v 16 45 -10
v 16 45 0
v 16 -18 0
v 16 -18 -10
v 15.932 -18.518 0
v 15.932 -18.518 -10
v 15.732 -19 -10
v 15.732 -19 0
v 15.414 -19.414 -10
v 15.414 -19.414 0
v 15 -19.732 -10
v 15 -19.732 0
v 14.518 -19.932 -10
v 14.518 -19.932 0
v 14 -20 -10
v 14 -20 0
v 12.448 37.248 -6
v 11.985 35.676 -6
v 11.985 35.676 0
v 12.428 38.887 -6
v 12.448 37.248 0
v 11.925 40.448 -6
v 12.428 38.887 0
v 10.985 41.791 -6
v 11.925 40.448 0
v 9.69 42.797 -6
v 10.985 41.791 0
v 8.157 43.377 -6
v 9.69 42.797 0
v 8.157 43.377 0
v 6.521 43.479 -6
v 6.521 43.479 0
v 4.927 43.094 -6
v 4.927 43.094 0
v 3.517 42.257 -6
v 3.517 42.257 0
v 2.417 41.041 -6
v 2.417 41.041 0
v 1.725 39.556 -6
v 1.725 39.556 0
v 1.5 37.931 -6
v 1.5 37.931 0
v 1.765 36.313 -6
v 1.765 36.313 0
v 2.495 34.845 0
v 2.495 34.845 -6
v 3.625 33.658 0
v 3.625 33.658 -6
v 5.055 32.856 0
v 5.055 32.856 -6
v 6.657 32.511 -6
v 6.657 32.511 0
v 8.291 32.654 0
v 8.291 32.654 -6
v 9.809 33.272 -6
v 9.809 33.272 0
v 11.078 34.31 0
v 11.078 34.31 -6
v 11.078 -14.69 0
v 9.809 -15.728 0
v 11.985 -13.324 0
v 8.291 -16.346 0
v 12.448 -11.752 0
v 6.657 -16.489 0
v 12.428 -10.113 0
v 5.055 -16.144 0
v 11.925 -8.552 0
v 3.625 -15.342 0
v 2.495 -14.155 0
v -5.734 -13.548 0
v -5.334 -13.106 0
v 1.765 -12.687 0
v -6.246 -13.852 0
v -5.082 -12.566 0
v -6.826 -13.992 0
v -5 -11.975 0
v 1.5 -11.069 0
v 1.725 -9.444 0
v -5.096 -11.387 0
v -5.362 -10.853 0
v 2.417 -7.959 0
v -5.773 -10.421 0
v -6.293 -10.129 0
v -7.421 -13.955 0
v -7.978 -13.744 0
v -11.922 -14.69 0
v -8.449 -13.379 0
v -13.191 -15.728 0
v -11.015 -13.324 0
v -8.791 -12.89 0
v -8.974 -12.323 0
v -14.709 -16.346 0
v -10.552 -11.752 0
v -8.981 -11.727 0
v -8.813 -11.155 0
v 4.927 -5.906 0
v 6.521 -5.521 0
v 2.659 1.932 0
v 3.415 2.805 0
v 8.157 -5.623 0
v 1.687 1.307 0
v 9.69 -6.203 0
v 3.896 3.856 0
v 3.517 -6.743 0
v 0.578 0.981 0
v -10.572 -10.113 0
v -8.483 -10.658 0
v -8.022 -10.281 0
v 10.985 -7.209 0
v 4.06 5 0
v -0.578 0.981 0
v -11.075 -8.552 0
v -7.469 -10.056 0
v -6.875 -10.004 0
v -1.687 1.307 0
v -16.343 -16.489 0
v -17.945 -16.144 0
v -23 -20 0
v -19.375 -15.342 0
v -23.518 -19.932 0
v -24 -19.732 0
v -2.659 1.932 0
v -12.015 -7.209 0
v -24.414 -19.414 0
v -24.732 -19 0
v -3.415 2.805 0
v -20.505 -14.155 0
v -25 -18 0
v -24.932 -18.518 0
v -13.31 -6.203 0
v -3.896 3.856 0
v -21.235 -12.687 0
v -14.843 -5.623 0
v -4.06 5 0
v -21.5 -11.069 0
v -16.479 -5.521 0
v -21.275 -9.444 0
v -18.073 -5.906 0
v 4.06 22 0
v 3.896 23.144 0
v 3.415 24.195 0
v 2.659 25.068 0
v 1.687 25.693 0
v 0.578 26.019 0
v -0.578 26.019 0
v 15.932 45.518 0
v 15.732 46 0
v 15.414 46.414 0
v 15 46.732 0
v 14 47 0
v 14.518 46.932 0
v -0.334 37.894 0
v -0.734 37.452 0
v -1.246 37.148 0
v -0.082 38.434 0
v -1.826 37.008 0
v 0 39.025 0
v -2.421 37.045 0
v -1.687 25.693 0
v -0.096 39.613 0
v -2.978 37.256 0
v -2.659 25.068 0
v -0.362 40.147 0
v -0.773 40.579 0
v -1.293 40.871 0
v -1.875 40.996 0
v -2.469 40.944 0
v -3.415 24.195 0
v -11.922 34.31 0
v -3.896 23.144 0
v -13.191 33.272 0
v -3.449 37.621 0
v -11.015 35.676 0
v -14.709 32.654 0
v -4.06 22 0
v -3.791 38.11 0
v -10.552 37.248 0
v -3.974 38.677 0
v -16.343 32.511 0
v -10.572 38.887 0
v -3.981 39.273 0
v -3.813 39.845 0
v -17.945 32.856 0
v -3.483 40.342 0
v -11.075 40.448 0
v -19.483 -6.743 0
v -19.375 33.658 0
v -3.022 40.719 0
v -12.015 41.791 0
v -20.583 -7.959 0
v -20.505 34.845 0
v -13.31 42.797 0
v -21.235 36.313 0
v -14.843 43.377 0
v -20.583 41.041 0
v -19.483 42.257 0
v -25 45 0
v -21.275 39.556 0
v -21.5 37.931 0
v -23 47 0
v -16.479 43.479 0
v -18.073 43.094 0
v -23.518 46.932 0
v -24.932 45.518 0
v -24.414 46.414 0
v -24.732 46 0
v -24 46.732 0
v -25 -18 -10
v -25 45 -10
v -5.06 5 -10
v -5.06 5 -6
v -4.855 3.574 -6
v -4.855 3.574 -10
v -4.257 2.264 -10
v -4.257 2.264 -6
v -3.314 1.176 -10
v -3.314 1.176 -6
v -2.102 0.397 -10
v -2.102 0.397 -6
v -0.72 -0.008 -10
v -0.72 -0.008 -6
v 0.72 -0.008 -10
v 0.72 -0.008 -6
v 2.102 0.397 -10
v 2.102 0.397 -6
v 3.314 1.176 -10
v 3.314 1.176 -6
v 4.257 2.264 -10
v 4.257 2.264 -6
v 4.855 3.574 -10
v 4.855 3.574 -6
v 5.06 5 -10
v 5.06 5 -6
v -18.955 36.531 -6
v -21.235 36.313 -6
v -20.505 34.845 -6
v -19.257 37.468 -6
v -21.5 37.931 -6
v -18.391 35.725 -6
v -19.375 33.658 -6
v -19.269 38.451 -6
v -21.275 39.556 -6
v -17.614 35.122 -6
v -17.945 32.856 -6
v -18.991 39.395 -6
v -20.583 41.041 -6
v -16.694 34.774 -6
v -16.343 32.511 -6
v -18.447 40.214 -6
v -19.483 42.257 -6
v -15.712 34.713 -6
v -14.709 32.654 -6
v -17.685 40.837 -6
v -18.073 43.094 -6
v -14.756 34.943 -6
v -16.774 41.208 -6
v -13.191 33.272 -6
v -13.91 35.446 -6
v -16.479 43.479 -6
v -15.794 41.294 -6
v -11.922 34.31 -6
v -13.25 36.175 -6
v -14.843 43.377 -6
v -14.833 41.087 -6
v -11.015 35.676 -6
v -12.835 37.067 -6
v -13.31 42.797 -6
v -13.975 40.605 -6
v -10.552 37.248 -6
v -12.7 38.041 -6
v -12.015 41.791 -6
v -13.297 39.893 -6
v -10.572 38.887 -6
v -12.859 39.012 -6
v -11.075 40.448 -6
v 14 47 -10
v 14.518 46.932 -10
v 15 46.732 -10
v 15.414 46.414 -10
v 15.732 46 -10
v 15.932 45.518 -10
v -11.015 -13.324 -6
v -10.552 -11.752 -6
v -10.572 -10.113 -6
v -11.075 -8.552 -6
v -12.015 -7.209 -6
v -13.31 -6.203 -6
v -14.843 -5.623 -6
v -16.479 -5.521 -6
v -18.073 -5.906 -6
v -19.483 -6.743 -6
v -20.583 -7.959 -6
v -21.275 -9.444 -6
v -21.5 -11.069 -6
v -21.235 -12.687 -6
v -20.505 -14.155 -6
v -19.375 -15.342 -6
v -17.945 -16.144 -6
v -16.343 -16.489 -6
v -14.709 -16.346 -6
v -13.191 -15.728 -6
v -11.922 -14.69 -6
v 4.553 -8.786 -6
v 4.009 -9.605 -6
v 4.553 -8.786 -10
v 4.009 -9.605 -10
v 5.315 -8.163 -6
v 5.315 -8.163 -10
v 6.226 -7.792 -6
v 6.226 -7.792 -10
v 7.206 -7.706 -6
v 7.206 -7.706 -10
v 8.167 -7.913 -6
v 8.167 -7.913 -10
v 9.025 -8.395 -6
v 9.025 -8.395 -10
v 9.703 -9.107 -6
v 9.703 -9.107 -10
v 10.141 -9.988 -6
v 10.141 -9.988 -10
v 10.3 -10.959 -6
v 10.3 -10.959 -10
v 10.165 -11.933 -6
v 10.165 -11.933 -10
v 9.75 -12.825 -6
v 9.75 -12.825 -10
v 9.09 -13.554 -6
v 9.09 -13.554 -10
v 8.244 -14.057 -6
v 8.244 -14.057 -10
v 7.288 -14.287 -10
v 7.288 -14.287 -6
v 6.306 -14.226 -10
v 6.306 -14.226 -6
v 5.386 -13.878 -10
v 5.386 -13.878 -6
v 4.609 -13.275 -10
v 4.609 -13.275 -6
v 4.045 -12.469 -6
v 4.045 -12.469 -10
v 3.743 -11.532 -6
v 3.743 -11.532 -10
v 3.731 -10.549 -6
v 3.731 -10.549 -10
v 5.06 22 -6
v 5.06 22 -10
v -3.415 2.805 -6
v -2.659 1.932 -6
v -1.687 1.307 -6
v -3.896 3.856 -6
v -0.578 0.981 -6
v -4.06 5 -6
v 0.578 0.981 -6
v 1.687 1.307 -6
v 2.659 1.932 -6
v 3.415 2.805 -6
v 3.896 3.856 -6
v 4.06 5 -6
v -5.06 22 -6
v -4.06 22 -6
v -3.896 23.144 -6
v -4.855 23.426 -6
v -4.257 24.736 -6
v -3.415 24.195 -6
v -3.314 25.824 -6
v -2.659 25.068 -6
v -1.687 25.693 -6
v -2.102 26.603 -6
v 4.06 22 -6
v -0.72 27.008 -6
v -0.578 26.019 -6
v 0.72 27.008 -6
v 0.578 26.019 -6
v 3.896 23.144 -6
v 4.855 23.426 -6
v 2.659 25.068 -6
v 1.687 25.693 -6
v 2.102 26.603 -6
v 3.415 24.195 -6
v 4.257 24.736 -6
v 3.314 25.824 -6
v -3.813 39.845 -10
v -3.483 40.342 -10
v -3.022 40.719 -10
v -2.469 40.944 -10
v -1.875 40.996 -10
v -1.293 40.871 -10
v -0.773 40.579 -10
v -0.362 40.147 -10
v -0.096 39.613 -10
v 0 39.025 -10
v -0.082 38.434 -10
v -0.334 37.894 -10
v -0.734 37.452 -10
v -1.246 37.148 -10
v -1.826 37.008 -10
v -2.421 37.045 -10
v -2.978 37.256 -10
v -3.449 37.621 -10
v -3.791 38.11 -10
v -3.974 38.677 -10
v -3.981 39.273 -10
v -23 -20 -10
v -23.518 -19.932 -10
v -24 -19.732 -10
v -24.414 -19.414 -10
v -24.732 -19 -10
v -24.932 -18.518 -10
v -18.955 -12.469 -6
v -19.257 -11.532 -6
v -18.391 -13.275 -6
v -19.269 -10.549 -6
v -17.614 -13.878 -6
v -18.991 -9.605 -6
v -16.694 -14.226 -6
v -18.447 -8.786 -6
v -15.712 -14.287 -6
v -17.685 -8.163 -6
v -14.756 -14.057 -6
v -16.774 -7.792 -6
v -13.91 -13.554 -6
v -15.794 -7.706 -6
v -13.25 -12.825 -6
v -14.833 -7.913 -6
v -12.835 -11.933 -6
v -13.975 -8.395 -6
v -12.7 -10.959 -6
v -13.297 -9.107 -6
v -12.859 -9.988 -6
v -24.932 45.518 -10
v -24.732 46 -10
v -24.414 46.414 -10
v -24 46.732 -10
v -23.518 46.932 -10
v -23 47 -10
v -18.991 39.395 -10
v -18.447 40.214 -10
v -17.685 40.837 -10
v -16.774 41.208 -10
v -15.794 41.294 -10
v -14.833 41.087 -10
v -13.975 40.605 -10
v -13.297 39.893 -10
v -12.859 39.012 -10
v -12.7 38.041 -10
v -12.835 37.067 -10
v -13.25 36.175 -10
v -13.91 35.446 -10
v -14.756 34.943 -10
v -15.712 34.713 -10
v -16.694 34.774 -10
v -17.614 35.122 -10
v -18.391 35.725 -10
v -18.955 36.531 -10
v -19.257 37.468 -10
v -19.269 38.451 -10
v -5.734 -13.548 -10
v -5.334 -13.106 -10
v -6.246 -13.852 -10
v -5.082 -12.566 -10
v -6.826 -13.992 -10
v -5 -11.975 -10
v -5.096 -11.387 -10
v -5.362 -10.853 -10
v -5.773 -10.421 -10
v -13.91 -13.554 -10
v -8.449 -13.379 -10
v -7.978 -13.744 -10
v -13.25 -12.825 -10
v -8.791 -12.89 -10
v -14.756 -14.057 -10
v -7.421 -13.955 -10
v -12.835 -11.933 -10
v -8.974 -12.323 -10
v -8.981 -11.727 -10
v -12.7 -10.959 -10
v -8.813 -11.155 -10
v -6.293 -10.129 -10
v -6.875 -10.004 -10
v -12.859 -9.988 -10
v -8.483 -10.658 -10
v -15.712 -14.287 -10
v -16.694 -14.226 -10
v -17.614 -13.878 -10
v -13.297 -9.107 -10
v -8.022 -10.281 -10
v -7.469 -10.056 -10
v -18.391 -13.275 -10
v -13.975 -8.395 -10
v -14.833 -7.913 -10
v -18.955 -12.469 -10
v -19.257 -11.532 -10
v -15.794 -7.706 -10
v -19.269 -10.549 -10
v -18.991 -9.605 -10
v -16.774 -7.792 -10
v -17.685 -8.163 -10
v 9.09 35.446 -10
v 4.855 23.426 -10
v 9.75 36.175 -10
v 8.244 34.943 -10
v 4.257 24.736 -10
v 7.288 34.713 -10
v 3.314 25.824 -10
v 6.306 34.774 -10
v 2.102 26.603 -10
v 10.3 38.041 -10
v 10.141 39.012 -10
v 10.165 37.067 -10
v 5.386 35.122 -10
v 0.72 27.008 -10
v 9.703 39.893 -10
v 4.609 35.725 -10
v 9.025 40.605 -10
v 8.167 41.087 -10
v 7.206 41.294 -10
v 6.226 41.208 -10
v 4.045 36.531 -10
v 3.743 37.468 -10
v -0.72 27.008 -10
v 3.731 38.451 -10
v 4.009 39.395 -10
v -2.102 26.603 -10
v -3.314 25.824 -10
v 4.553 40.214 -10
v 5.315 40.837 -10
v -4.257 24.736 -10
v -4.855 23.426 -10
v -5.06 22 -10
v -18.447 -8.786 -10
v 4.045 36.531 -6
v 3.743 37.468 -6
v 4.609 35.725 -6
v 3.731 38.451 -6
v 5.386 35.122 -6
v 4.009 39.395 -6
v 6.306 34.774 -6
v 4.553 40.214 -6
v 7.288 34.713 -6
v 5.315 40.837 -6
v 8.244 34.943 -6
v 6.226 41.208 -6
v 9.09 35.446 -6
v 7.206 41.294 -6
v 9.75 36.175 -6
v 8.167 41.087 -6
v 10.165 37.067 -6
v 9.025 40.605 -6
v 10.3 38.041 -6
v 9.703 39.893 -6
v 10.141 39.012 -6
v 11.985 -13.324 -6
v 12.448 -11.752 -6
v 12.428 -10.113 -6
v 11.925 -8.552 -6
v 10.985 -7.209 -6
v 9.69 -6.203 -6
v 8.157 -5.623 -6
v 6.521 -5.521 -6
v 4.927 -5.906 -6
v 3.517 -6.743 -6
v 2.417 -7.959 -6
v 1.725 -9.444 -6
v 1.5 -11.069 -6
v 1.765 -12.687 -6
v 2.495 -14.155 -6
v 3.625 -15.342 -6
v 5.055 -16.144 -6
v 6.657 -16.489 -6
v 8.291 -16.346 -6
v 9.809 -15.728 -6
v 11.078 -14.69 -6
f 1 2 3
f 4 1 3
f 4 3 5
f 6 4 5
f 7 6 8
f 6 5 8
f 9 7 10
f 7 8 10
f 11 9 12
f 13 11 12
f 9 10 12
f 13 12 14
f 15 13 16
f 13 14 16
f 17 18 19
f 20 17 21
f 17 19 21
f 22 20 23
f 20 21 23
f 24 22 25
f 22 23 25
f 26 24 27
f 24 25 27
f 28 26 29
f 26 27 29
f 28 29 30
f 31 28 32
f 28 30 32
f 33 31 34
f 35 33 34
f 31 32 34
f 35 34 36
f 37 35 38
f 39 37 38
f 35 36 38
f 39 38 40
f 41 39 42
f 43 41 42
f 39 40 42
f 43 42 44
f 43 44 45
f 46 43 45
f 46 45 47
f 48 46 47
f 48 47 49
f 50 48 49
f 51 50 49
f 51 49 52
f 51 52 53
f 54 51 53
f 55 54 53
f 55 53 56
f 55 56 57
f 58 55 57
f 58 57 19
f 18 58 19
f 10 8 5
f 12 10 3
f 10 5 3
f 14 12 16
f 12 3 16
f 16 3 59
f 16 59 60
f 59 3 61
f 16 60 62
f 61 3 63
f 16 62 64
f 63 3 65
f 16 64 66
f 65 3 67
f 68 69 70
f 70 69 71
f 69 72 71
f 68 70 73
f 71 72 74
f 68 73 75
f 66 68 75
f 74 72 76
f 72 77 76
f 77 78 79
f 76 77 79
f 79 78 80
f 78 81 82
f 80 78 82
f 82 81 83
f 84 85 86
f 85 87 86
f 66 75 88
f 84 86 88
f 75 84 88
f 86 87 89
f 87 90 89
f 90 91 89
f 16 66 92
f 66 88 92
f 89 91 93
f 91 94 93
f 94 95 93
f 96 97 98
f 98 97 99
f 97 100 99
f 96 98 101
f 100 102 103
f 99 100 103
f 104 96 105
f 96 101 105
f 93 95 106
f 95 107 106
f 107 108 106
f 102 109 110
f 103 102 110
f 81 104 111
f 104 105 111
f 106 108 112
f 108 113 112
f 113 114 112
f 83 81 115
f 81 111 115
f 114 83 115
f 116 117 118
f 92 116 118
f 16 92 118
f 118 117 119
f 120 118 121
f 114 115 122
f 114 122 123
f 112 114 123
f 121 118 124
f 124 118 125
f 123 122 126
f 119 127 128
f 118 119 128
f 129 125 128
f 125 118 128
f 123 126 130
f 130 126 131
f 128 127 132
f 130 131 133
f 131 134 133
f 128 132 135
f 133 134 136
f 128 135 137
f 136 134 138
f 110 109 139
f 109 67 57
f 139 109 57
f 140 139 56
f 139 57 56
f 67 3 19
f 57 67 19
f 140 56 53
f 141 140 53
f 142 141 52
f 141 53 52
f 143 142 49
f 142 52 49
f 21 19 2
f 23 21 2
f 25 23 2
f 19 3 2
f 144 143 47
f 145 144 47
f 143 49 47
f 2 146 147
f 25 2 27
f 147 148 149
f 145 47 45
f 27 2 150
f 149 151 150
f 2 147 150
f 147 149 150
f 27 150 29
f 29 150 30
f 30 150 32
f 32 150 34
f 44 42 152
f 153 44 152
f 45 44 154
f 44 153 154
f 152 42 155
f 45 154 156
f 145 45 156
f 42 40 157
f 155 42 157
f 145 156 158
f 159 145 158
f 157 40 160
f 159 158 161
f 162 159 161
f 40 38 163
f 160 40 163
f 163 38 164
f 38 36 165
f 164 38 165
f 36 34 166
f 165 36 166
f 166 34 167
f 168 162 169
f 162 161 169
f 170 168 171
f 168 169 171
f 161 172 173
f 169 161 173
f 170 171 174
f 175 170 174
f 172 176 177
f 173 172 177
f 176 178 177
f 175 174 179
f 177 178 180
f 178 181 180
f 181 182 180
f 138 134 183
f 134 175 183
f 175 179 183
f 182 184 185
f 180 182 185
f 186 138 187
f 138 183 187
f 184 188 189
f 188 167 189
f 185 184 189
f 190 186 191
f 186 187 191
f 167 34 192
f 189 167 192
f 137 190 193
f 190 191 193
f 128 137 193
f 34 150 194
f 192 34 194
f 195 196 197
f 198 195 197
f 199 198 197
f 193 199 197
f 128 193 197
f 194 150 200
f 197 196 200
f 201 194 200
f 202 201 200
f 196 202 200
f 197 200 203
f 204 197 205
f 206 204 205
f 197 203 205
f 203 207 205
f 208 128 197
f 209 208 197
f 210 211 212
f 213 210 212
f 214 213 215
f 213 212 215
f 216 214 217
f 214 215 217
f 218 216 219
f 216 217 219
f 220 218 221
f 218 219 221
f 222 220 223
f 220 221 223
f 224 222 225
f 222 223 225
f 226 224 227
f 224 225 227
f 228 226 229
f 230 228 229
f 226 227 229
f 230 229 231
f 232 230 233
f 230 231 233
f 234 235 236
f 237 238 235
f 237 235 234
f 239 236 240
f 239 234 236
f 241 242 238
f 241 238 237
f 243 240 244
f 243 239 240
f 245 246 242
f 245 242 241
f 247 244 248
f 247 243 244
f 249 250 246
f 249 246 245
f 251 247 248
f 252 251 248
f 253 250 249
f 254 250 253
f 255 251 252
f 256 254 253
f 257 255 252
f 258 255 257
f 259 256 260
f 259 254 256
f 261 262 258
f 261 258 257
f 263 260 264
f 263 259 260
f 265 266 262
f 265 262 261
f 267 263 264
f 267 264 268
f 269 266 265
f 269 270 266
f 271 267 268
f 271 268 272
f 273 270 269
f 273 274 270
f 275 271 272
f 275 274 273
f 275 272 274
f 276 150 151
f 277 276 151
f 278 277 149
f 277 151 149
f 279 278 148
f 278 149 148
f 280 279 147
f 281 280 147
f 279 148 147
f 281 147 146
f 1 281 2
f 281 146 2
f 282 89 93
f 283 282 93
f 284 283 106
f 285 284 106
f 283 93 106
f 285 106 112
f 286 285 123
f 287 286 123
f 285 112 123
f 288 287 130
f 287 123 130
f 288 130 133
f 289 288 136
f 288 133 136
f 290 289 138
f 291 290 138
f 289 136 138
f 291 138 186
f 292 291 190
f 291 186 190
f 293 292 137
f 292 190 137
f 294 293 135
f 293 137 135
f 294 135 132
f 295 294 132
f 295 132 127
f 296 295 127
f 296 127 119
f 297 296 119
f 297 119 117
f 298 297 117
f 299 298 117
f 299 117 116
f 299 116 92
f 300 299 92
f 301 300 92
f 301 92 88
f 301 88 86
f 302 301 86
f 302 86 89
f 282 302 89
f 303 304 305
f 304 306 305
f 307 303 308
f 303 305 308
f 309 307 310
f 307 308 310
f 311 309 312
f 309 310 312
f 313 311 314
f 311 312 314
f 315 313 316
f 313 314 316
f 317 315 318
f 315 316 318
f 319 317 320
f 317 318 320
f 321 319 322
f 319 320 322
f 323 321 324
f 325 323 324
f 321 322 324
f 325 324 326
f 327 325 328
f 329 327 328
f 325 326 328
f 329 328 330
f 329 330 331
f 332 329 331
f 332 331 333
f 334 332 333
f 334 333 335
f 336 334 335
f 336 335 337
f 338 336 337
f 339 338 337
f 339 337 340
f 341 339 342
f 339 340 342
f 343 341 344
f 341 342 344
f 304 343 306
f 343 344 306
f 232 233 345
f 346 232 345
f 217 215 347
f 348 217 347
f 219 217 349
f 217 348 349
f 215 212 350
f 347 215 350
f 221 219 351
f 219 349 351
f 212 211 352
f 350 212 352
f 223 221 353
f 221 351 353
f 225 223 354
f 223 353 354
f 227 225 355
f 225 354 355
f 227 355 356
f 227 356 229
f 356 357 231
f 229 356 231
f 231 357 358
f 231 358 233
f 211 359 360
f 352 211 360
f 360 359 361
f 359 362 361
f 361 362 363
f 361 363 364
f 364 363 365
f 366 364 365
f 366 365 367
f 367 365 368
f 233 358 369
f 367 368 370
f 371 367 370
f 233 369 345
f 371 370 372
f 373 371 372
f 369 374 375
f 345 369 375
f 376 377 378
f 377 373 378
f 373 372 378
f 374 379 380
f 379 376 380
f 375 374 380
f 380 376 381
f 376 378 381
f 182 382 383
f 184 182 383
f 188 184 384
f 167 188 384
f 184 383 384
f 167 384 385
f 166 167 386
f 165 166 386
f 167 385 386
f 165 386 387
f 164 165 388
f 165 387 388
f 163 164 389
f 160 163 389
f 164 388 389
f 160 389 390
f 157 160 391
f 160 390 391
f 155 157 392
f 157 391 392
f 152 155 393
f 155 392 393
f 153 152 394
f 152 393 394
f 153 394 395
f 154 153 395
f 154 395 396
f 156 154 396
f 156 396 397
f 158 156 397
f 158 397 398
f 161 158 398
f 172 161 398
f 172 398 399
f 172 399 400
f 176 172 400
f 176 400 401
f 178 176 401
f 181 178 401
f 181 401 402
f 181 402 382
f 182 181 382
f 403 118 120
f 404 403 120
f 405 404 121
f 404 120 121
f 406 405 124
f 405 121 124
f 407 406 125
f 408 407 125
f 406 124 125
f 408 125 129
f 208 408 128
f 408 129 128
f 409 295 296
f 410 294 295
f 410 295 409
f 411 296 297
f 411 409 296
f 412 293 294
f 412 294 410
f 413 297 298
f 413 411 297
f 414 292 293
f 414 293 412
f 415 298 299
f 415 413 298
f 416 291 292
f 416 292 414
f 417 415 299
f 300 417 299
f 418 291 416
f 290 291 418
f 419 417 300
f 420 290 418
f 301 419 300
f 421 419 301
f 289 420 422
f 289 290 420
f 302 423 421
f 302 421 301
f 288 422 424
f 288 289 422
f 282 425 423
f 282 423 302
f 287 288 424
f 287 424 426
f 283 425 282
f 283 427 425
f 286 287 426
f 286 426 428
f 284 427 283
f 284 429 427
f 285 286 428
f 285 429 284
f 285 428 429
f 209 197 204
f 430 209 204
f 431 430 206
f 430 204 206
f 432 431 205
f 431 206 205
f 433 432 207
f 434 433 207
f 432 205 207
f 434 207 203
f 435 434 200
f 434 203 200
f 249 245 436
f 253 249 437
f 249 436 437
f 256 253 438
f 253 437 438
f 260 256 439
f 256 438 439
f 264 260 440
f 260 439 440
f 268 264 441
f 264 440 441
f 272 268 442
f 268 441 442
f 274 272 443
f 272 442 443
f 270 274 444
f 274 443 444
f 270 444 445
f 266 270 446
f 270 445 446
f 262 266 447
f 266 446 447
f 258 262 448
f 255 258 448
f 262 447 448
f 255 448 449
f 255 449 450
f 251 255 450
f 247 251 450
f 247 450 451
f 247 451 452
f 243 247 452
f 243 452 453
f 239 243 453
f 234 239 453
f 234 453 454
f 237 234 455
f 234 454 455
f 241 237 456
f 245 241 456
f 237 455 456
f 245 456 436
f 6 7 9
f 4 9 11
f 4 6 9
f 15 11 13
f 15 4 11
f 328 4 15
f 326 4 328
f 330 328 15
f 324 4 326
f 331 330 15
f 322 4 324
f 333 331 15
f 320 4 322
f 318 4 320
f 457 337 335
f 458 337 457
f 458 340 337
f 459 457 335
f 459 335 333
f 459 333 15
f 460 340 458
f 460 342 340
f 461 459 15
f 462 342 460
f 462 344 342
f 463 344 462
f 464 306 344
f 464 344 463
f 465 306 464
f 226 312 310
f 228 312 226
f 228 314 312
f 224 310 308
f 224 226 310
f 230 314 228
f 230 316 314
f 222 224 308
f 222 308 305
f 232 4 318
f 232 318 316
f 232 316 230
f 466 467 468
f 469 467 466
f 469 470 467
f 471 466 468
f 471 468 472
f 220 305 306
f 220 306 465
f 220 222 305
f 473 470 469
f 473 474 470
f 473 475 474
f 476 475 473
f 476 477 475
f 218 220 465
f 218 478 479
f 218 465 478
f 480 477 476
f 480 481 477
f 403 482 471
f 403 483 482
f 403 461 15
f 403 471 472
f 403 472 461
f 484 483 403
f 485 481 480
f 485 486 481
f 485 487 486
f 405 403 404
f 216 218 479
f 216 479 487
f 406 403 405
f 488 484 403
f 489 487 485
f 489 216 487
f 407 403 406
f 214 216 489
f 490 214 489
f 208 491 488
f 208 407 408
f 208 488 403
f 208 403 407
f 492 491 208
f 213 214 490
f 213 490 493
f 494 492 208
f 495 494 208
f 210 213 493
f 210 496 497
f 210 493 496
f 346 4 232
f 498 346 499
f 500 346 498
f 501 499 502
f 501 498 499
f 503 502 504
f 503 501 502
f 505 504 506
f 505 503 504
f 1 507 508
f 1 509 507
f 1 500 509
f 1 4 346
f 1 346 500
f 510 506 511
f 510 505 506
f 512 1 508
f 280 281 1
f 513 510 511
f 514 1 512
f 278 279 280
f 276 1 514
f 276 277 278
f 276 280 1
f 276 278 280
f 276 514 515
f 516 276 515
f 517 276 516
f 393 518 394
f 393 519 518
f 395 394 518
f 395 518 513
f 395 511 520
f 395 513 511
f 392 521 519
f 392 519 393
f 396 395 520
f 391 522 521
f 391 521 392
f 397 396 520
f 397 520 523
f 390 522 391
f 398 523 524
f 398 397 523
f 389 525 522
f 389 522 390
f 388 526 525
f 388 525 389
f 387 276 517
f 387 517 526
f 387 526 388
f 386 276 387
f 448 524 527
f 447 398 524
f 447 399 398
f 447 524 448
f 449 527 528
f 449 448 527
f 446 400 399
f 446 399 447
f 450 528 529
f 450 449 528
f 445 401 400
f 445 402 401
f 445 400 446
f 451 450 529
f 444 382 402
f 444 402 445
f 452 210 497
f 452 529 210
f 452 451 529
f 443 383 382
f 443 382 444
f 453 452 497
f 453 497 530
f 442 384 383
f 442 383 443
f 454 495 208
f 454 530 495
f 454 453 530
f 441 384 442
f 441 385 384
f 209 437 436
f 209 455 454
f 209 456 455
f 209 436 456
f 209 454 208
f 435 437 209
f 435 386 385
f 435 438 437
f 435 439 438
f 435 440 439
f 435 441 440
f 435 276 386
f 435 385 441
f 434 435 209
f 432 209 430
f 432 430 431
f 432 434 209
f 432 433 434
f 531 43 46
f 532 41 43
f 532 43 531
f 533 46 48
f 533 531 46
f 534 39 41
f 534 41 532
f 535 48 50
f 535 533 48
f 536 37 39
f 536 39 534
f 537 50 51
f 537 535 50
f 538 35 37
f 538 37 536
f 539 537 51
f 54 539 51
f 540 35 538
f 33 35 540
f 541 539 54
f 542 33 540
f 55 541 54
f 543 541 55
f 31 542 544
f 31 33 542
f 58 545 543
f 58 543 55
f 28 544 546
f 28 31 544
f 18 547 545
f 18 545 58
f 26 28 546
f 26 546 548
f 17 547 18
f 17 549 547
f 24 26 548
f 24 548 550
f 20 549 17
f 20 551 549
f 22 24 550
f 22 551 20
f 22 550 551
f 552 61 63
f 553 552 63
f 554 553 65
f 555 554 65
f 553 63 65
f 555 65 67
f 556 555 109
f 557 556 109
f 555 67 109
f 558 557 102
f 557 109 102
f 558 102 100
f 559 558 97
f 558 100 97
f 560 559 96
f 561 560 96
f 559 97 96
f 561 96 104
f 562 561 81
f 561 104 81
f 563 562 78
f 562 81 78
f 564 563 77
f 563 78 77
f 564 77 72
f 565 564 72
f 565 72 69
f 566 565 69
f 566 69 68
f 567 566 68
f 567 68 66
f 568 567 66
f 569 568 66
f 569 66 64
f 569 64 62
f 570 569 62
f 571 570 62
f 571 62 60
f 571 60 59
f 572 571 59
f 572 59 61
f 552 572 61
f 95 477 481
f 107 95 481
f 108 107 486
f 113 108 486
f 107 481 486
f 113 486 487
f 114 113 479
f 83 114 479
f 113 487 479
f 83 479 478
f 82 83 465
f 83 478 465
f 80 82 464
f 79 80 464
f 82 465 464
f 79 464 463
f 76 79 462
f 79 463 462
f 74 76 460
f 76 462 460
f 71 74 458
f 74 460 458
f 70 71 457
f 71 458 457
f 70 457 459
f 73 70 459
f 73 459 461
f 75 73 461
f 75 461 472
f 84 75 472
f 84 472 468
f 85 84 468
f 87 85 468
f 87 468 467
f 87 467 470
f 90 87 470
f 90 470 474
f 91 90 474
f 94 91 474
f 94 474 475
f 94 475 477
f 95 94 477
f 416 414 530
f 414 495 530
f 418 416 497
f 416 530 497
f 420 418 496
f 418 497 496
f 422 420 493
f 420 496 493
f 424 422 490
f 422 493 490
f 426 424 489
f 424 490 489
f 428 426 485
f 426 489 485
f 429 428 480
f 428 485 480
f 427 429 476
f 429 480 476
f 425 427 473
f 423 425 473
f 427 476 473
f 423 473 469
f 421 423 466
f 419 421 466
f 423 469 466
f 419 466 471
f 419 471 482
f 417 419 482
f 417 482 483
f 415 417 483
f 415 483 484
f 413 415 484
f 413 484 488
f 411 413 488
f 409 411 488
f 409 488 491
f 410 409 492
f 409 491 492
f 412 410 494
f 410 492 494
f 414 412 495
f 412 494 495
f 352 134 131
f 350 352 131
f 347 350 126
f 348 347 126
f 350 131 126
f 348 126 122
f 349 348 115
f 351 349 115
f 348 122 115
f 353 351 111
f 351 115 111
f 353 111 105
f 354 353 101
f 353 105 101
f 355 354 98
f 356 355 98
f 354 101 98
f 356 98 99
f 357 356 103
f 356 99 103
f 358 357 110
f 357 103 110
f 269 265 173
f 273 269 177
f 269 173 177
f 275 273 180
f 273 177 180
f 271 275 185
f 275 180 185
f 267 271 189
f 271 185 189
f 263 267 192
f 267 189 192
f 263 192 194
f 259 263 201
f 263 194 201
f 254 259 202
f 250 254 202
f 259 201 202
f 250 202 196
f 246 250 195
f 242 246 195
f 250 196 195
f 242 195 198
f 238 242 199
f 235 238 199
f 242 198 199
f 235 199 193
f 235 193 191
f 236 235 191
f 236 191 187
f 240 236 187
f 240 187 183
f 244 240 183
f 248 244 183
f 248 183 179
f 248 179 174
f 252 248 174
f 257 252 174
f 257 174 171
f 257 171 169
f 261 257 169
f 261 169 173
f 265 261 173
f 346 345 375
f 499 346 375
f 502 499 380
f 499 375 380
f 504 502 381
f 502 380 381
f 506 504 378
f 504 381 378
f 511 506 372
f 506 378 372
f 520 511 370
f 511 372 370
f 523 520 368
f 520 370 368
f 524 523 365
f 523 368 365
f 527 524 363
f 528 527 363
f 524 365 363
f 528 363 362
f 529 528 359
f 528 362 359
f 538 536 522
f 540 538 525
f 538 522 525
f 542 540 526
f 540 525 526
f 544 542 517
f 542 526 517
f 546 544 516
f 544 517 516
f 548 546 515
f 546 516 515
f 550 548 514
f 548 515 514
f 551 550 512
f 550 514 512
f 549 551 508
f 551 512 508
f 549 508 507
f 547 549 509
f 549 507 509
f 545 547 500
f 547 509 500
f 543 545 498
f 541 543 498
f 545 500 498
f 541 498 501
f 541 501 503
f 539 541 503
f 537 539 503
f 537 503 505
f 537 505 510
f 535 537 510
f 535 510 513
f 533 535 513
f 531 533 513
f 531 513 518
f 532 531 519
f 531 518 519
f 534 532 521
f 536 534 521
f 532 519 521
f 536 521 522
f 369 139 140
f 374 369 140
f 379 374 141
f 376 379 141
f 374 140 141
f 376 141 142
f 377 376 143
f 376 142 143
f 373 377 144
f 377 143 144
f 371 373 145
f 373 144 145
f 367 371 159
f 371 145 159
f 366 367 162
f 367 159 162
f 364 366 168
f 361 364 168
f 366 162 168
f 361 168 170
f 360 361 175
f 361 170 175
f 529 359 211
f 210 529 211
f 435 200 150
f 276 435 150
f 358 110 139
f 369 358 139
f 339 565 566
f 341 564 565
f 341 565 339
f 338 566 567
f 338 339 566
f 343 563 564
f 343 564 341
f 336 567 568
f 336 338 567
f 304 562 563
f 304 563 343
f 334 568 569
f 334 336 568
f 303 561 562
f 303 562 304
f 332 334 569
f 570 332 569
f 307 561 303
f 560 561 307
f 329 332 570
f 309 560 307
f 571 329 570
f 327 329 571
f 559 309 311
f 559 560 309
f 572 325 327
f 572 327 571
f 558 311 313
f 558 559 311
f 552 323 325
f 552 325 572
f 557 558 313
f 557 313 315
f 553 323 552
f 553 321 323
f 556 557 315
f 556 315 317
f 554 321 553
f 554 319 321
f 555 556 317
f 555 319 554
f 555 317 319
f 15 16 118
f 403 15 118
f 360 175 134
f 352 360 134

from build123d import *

# Parameters (mm, degrees)
BOSS_EXTRUDE1_DEPTH             = 10
CUT_EXTRUDE1_START              = -6
CUT_EXTRUDE1_DEPTH              = 4
CBORE_FOR_M6_SHCS1_D            = 6.6
CBORE_FOR_M6_SHCS1_CBORE_D      = 11
CBORE_FOR_M6_SHCS1_CBORE_DEPTH  = 6
F_4_0MM_CLEARANCE_DOWEL_HOLE1_D = 4


with BuildPart() as part:
    # Sketch2 → Boss-Extrude1 (new body)
    with BuildSketch(Plane.XY):
        with BuildLine():
            Line((-23, 47), (14, 47))
            ThreePointArc((14, 47), (15.414213562, 46.414213562), (16, 45))
            Line((16, 45), (16, -18))
            ThreePointArc((16, -18), (15.414213562, -19.414213562), (14, -20))
            Line((14, -20), (-23, -20))
            ThreePointArc((-23, -20), (-24.414213562, -19.414213562), (-25, -18))
            Line((-25, -18), (-25, 45))
            ThreePointArc((-25, 45), (-24.414213562, 46.414213562), (-23, 47))
        make_face()
        with BuildLine():
            Line((-4.06, 22), (-4.06, 5))
            ThreePointArc((-4.06, 5), (0, 0.94), (4.06, 5))
            Line((4.06, 5), (4.06, 22))
            ThreePointArc((4.06, 22), (0, 26.06), (-4.06, 22))
        make_face(mode=Mode.SUBTRACT)
    extrude(amount=-BOSS_EXTRUDE1_DEPTH)

    # Sketch3 → Cut-Extrude1 (cut)
    with BuildSketch(Plane.XY.offset(CUT_EXTRUDE1_START)):
        with BuildLine():
            Line((-5.06, 22), (-5.06, 5))
            ThreePointArc((-5.06, 5), (0, -0.06), (5.06, 5))
            Line((5.06, 5), (5.06, 22))
            ThreePointArc((5.06, 22), (0, 27.06), (-5.06, 22))
        make_face()
    extrude(amount=-CUT_EXTRUDE1_DEPTH, mode=Mode.SUBTRACT)

    # CBORE for M6 SHCS1 (through all)
    with Locations(Plane(origin=(0, 0, 0), x_dir=(0.9063077870366375, -0.4226182617407263, 0), z_dir=(0, 0, 1))):
        with Locations((-30.560418539, 27.67780372), (10.992955388, -7.011057825), (-9.852123713, -16.731277845), (-9.715339437, 37.39802374)):
            CounterBoreHole(CBORE_FOR_M6_SHCS1_D / 2, CBORE_FOR_M6_SHCS1_CBORE_D / 2, CBORE_FOR_M6_SHCS1_CBORE_DEPTH)

    # Ø4.0mm Clearance Dowel Hole1 (through all)
    with Locations(Plane(origin=(0, 0, 0), x_dir=(0.9063077870366375, -0.4226182617407263, 0), z_dir=(0, 0, 1))):
        with Locations((-18.294727782, 34.500767171), (-1.272735368, -13.834021277)):
            Hole(F_4_0MM_CLEARANCE_DOWEL_HOLE1_D / 2)


solid = part.part
